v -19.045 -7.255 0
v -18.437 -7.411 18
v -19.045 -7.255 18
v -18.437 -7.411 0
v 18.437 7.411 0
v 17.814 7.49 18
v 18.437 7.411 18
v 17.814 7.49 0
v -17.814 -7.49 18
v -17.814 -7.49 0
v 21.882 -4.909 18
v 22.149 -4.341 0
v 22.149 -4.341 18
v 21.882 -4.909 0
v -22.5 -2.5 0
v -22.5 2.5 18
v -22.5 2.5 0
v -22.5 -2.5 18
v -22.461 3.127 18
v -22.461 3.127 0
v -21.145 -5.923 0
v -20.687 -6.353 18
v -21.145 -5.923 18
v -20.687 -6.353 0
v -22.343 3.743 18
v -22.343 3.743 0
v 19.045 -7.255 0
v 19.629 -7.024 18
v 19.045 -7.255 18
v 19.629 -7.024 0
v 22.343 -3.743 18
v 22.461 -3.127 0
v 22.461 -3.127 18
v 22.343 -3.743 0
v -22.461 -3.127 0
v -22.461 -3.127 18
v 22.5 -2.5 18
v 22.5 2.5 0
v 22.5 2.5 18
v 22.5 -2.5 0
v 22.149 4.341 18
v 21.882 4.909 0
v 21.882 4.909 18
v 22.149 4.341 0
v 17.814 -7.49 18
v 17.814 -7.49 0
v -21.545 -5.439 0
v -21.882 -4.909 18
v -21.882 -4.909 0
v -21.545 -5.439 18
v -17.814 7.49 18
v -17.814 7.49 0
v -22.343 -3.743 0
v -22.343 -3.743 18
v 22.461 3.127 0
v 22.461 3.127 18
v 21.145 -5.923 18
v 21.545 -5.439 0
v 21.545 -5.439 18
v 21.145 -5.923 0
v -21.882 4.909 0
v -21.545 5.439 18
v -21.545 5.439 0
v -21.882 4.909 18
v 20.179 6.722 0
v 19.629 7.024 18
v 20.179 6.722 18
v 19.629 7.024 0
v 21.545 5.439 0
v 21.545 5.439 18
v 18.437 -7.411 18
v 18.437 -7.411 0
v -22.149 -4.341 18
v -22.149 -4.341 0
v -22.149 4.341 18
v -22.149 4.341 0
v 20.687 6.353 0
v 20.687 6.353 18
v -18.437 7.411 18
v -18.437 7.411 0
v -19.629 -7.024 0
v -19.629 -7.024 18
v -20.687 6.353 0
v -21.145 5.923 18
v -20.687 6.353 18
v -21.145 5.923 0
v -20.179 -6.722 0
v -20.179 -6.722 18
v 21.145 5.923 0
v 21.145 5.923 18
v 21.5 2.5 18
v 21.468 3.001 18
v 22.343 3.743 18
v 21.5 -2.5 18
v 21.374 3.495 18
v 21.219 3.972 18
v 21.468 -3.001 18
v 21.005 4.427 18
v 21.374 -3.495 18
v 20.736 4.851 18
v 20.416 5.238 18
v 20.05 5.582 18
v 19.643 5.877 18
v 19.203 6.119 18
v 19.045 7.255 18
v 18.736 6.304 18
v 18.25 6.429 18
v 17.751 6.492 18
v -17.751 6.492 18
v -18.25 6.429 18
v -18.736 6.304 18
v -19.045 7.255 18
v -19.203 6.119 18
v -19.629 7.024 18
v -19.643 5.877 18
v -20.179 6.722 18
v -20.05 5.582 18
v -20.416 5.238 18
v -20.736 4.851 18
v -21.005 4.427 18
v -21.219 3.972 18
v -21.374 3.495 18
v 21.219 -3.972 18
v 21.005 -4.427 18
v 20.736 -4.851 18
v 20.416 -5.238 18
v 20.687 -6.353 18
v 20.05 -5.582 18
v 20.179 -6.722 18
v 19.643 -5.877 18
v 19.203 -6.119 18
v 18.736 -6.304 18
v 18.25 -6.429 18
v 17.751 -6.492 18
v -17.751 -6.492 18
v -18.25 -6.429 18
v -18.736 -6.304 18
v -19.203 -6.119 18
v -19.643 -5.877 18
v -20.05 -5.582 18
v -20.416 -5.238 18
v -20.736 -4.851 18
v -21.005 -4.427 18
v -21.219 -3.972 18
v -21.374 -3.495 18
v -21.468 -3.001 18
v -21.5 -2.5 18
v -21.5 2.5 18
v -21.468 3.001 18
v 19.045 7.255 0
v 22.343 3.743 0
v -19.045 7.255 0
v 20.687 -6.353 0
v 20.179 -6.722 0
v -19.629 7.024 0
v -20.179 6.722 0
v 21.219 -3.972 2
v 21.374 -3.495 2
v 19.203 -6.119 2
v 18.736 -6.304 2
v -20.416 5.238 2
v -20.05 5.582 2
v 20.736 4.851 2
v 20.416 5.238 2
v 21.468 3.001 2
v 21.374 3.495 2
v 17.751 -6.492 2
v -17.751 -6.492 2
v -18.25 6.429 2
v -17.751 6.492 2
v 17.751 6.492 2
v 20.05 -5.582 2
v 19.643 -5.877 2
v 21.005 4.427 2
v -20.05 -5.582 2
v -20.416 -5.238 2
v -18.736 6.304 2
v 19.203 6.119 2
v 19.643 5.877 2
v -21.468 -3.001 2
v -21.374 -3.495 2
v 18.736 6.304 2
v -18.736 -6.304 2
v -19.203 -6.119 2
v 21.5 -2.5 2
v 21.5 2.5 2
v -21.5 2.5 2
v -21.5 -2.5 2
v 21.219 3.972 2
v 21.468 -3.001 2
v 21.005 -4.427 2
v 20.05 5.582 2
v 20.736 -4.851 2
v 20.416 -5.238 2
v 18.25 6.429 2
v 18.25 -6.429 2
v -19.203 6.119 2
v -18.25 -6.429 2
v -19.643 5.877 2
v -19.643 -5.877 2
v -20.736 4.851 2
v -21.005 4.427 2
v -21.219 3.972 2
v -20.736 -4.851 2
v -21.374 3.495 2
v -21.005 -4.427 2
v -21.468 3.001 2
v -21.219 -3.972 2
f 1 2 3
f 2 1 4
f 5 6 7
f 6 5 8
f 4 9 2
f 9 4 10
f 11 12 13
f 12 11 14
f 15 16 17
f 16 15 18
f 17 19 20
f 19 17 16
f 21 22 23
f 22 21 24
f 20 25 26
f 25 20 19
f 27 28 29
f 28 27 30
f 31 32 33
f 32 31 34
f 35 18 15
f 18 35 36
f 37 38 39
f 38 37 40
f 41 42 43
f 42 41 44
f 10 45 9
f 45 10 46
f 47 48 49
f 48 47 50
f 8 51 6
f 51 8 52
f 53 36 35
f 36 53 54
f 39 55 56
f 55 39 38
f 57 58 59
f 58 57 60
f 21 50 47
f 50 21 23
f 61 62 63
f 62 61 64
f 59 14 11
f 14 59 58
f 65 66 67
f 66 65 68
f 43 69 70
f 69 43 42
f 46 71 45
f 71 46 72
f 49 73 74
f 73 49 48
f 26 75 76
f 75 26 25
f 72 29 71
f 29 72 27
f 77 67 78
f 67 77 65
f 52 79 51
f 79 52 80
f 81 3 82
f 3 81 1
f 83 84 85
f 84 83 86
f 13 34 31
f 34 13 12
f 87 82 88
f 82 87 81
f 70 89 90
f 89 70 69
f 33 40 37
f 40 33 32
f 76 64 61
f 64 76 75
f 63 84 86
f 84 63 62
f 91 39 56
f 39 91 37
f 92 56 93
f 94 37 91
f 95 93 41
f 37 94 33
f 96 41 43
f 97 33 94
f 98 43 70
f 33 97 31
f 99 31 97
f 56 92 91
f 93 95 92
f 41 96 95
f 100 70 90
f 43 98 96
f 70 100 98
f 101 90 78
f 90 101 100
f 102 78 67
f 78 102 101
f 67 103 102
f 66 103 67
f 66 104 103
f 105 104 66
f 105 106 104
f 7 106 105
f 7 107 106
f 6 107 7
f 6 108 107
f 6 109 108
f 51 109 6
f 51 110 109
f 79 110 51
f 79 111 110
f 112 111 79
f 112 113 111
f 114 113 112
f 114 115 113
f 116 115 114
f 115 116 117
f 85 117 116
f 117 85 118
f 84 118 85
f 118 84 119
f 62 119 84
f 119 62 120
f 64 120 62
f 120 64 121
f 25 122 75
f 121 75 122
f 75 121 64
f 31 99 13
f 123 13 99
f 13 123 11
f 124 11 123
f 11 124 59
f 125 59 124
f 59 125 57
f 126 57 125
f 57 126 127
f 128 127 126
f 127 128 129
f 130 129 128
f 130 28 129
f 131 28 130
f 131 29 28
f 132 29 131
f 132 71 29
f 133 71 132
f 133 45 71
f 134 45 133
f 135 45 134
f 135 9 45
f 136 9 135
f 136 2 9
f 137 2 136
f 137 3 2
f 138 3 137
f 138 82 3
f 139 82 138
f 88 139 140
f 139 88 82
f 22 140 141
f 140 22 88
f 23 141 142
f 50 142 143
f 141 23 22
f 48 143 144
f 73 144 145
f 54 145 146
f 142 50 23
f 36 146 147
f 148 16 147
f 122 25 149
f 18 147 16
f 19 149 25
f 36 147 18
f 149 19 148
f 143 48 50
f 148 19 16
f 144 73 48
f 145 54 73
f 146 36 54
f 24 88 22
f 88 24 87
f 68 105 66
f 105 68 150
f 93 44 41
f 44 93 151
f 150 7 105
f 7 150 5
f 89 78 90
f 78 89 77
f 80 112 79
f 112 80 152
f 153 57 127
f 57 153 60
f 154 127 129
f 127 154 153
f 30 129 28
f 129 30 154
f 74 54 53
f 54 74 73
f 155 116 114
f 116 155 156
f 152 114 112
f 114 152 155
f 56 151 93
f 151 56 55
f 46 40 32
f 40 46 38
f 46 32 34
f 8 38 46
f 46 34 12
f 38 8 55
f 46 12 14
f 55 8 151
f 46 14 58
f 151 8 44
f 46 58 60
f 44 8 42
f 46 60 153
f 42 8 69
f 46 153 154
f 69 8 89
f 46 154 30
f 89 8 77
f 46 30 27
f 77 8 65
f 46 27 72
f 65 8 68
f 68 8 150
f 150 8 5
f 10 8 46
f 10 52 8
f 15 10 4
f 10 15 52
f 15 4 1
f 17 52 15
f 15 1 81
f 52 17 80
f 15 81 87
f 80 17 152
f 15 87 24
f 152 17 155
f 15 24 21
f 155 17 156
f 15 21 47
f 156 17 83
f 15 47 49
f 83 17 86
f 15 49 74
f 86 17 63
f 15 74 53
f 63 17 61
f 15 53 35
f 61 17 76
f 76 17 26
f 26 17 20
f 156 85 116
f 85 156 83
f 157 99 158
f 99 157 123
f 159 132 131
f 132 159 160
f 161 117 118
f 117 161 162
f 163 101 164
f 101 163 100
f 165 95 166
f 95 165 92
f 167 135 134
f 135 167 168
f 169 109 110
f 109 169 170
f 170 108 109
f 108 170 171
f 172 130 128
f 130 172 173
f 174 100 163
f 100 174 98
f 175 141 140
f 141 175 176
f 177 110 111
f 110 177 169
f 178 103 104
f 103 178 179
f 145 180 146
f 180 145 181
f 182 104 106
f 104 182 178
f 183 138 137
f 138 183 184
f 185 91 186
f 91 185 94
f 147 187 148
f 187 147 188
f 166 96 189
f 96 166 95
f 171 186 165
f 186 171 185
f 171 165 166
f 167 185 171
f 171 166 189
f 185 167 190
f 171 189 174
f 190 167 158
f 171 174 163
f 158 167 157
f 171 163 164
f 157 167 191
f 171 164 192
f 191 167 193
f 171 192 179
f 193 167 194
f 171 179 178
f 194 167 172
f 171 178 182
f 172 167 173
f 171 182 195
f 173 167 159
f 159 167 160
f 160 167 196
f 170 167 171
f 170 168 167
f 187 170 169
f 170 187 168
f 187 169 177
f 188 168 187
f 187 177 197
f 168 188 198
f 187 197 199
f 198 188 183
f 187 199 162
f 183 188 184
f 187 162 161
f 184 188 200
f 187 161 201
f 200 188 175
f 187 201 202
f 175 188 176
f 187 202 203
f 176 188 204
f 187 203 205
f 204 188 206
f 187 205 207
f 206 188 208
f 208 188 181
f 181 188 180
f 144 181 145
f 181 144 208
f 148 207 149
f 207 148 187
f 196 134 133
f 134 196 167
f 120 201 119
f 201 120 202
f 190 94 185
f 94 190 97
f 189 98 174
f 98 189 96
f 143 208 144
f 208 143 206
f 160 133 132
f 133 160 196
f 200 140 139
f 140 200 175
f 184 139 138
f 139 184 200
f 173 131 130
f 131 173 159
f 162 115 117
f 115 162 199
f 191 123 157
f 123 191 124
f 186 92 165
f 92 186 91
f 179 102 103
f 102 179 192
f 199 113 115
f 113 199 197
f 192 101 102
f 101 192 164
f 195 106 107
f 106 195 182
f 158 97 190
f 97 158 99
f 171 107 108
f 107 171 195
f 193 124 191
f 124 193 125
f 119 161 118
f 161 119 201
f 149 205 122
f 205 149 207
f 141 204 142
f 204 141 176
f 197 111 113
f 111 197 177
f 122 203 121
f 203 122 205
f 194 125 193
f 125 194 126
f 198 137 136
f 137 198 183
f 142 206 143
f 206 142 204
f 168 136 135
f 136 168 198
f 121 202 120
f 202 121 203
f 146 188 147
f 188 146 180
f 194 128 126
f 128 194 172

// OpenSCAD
$fn = 50;


difference() {
	union() {
		hull() {
			translate(v = [-17.5000000000, 2.5000000000, 0]) {
				cylinder(h = 18, r = 5);
			}
			translate(v = [17.5000000000, 2.5000000000, 0]) {
				cylinder(h = 18, r = 5);
			}
			translate(v = [-17.5000000000, -2.5000000000, 0]) {
				cylinder(h = 18, r = 5);
			}
			translate(v = [17.5000000000, -2.5000000000, 0]) {
				cylinder(h = 18, r = 5);
			}
		}
	}
	union() {
		translate(v = [0, 0, 2]) {
			hull() {
				translate(v = [-17.5000000000, 2.5000000000, 0]) {
					cylinder(h = 16, r = 4);
				}
				translate(v = [17.5000000000, 2.5000000000, 0]) {
					cylinder(h = 16, r = 4);
				}
				translate(v = [-17.5000000000, -2.5000000000, 0]) {
					cylinder(h = 16, r = 4);
				}
				translate(v = [17.5000000000, -2.5000000000, 0]) {
					cylinder(h = 16, r = 4);
				}
			}
		}
	}
}
